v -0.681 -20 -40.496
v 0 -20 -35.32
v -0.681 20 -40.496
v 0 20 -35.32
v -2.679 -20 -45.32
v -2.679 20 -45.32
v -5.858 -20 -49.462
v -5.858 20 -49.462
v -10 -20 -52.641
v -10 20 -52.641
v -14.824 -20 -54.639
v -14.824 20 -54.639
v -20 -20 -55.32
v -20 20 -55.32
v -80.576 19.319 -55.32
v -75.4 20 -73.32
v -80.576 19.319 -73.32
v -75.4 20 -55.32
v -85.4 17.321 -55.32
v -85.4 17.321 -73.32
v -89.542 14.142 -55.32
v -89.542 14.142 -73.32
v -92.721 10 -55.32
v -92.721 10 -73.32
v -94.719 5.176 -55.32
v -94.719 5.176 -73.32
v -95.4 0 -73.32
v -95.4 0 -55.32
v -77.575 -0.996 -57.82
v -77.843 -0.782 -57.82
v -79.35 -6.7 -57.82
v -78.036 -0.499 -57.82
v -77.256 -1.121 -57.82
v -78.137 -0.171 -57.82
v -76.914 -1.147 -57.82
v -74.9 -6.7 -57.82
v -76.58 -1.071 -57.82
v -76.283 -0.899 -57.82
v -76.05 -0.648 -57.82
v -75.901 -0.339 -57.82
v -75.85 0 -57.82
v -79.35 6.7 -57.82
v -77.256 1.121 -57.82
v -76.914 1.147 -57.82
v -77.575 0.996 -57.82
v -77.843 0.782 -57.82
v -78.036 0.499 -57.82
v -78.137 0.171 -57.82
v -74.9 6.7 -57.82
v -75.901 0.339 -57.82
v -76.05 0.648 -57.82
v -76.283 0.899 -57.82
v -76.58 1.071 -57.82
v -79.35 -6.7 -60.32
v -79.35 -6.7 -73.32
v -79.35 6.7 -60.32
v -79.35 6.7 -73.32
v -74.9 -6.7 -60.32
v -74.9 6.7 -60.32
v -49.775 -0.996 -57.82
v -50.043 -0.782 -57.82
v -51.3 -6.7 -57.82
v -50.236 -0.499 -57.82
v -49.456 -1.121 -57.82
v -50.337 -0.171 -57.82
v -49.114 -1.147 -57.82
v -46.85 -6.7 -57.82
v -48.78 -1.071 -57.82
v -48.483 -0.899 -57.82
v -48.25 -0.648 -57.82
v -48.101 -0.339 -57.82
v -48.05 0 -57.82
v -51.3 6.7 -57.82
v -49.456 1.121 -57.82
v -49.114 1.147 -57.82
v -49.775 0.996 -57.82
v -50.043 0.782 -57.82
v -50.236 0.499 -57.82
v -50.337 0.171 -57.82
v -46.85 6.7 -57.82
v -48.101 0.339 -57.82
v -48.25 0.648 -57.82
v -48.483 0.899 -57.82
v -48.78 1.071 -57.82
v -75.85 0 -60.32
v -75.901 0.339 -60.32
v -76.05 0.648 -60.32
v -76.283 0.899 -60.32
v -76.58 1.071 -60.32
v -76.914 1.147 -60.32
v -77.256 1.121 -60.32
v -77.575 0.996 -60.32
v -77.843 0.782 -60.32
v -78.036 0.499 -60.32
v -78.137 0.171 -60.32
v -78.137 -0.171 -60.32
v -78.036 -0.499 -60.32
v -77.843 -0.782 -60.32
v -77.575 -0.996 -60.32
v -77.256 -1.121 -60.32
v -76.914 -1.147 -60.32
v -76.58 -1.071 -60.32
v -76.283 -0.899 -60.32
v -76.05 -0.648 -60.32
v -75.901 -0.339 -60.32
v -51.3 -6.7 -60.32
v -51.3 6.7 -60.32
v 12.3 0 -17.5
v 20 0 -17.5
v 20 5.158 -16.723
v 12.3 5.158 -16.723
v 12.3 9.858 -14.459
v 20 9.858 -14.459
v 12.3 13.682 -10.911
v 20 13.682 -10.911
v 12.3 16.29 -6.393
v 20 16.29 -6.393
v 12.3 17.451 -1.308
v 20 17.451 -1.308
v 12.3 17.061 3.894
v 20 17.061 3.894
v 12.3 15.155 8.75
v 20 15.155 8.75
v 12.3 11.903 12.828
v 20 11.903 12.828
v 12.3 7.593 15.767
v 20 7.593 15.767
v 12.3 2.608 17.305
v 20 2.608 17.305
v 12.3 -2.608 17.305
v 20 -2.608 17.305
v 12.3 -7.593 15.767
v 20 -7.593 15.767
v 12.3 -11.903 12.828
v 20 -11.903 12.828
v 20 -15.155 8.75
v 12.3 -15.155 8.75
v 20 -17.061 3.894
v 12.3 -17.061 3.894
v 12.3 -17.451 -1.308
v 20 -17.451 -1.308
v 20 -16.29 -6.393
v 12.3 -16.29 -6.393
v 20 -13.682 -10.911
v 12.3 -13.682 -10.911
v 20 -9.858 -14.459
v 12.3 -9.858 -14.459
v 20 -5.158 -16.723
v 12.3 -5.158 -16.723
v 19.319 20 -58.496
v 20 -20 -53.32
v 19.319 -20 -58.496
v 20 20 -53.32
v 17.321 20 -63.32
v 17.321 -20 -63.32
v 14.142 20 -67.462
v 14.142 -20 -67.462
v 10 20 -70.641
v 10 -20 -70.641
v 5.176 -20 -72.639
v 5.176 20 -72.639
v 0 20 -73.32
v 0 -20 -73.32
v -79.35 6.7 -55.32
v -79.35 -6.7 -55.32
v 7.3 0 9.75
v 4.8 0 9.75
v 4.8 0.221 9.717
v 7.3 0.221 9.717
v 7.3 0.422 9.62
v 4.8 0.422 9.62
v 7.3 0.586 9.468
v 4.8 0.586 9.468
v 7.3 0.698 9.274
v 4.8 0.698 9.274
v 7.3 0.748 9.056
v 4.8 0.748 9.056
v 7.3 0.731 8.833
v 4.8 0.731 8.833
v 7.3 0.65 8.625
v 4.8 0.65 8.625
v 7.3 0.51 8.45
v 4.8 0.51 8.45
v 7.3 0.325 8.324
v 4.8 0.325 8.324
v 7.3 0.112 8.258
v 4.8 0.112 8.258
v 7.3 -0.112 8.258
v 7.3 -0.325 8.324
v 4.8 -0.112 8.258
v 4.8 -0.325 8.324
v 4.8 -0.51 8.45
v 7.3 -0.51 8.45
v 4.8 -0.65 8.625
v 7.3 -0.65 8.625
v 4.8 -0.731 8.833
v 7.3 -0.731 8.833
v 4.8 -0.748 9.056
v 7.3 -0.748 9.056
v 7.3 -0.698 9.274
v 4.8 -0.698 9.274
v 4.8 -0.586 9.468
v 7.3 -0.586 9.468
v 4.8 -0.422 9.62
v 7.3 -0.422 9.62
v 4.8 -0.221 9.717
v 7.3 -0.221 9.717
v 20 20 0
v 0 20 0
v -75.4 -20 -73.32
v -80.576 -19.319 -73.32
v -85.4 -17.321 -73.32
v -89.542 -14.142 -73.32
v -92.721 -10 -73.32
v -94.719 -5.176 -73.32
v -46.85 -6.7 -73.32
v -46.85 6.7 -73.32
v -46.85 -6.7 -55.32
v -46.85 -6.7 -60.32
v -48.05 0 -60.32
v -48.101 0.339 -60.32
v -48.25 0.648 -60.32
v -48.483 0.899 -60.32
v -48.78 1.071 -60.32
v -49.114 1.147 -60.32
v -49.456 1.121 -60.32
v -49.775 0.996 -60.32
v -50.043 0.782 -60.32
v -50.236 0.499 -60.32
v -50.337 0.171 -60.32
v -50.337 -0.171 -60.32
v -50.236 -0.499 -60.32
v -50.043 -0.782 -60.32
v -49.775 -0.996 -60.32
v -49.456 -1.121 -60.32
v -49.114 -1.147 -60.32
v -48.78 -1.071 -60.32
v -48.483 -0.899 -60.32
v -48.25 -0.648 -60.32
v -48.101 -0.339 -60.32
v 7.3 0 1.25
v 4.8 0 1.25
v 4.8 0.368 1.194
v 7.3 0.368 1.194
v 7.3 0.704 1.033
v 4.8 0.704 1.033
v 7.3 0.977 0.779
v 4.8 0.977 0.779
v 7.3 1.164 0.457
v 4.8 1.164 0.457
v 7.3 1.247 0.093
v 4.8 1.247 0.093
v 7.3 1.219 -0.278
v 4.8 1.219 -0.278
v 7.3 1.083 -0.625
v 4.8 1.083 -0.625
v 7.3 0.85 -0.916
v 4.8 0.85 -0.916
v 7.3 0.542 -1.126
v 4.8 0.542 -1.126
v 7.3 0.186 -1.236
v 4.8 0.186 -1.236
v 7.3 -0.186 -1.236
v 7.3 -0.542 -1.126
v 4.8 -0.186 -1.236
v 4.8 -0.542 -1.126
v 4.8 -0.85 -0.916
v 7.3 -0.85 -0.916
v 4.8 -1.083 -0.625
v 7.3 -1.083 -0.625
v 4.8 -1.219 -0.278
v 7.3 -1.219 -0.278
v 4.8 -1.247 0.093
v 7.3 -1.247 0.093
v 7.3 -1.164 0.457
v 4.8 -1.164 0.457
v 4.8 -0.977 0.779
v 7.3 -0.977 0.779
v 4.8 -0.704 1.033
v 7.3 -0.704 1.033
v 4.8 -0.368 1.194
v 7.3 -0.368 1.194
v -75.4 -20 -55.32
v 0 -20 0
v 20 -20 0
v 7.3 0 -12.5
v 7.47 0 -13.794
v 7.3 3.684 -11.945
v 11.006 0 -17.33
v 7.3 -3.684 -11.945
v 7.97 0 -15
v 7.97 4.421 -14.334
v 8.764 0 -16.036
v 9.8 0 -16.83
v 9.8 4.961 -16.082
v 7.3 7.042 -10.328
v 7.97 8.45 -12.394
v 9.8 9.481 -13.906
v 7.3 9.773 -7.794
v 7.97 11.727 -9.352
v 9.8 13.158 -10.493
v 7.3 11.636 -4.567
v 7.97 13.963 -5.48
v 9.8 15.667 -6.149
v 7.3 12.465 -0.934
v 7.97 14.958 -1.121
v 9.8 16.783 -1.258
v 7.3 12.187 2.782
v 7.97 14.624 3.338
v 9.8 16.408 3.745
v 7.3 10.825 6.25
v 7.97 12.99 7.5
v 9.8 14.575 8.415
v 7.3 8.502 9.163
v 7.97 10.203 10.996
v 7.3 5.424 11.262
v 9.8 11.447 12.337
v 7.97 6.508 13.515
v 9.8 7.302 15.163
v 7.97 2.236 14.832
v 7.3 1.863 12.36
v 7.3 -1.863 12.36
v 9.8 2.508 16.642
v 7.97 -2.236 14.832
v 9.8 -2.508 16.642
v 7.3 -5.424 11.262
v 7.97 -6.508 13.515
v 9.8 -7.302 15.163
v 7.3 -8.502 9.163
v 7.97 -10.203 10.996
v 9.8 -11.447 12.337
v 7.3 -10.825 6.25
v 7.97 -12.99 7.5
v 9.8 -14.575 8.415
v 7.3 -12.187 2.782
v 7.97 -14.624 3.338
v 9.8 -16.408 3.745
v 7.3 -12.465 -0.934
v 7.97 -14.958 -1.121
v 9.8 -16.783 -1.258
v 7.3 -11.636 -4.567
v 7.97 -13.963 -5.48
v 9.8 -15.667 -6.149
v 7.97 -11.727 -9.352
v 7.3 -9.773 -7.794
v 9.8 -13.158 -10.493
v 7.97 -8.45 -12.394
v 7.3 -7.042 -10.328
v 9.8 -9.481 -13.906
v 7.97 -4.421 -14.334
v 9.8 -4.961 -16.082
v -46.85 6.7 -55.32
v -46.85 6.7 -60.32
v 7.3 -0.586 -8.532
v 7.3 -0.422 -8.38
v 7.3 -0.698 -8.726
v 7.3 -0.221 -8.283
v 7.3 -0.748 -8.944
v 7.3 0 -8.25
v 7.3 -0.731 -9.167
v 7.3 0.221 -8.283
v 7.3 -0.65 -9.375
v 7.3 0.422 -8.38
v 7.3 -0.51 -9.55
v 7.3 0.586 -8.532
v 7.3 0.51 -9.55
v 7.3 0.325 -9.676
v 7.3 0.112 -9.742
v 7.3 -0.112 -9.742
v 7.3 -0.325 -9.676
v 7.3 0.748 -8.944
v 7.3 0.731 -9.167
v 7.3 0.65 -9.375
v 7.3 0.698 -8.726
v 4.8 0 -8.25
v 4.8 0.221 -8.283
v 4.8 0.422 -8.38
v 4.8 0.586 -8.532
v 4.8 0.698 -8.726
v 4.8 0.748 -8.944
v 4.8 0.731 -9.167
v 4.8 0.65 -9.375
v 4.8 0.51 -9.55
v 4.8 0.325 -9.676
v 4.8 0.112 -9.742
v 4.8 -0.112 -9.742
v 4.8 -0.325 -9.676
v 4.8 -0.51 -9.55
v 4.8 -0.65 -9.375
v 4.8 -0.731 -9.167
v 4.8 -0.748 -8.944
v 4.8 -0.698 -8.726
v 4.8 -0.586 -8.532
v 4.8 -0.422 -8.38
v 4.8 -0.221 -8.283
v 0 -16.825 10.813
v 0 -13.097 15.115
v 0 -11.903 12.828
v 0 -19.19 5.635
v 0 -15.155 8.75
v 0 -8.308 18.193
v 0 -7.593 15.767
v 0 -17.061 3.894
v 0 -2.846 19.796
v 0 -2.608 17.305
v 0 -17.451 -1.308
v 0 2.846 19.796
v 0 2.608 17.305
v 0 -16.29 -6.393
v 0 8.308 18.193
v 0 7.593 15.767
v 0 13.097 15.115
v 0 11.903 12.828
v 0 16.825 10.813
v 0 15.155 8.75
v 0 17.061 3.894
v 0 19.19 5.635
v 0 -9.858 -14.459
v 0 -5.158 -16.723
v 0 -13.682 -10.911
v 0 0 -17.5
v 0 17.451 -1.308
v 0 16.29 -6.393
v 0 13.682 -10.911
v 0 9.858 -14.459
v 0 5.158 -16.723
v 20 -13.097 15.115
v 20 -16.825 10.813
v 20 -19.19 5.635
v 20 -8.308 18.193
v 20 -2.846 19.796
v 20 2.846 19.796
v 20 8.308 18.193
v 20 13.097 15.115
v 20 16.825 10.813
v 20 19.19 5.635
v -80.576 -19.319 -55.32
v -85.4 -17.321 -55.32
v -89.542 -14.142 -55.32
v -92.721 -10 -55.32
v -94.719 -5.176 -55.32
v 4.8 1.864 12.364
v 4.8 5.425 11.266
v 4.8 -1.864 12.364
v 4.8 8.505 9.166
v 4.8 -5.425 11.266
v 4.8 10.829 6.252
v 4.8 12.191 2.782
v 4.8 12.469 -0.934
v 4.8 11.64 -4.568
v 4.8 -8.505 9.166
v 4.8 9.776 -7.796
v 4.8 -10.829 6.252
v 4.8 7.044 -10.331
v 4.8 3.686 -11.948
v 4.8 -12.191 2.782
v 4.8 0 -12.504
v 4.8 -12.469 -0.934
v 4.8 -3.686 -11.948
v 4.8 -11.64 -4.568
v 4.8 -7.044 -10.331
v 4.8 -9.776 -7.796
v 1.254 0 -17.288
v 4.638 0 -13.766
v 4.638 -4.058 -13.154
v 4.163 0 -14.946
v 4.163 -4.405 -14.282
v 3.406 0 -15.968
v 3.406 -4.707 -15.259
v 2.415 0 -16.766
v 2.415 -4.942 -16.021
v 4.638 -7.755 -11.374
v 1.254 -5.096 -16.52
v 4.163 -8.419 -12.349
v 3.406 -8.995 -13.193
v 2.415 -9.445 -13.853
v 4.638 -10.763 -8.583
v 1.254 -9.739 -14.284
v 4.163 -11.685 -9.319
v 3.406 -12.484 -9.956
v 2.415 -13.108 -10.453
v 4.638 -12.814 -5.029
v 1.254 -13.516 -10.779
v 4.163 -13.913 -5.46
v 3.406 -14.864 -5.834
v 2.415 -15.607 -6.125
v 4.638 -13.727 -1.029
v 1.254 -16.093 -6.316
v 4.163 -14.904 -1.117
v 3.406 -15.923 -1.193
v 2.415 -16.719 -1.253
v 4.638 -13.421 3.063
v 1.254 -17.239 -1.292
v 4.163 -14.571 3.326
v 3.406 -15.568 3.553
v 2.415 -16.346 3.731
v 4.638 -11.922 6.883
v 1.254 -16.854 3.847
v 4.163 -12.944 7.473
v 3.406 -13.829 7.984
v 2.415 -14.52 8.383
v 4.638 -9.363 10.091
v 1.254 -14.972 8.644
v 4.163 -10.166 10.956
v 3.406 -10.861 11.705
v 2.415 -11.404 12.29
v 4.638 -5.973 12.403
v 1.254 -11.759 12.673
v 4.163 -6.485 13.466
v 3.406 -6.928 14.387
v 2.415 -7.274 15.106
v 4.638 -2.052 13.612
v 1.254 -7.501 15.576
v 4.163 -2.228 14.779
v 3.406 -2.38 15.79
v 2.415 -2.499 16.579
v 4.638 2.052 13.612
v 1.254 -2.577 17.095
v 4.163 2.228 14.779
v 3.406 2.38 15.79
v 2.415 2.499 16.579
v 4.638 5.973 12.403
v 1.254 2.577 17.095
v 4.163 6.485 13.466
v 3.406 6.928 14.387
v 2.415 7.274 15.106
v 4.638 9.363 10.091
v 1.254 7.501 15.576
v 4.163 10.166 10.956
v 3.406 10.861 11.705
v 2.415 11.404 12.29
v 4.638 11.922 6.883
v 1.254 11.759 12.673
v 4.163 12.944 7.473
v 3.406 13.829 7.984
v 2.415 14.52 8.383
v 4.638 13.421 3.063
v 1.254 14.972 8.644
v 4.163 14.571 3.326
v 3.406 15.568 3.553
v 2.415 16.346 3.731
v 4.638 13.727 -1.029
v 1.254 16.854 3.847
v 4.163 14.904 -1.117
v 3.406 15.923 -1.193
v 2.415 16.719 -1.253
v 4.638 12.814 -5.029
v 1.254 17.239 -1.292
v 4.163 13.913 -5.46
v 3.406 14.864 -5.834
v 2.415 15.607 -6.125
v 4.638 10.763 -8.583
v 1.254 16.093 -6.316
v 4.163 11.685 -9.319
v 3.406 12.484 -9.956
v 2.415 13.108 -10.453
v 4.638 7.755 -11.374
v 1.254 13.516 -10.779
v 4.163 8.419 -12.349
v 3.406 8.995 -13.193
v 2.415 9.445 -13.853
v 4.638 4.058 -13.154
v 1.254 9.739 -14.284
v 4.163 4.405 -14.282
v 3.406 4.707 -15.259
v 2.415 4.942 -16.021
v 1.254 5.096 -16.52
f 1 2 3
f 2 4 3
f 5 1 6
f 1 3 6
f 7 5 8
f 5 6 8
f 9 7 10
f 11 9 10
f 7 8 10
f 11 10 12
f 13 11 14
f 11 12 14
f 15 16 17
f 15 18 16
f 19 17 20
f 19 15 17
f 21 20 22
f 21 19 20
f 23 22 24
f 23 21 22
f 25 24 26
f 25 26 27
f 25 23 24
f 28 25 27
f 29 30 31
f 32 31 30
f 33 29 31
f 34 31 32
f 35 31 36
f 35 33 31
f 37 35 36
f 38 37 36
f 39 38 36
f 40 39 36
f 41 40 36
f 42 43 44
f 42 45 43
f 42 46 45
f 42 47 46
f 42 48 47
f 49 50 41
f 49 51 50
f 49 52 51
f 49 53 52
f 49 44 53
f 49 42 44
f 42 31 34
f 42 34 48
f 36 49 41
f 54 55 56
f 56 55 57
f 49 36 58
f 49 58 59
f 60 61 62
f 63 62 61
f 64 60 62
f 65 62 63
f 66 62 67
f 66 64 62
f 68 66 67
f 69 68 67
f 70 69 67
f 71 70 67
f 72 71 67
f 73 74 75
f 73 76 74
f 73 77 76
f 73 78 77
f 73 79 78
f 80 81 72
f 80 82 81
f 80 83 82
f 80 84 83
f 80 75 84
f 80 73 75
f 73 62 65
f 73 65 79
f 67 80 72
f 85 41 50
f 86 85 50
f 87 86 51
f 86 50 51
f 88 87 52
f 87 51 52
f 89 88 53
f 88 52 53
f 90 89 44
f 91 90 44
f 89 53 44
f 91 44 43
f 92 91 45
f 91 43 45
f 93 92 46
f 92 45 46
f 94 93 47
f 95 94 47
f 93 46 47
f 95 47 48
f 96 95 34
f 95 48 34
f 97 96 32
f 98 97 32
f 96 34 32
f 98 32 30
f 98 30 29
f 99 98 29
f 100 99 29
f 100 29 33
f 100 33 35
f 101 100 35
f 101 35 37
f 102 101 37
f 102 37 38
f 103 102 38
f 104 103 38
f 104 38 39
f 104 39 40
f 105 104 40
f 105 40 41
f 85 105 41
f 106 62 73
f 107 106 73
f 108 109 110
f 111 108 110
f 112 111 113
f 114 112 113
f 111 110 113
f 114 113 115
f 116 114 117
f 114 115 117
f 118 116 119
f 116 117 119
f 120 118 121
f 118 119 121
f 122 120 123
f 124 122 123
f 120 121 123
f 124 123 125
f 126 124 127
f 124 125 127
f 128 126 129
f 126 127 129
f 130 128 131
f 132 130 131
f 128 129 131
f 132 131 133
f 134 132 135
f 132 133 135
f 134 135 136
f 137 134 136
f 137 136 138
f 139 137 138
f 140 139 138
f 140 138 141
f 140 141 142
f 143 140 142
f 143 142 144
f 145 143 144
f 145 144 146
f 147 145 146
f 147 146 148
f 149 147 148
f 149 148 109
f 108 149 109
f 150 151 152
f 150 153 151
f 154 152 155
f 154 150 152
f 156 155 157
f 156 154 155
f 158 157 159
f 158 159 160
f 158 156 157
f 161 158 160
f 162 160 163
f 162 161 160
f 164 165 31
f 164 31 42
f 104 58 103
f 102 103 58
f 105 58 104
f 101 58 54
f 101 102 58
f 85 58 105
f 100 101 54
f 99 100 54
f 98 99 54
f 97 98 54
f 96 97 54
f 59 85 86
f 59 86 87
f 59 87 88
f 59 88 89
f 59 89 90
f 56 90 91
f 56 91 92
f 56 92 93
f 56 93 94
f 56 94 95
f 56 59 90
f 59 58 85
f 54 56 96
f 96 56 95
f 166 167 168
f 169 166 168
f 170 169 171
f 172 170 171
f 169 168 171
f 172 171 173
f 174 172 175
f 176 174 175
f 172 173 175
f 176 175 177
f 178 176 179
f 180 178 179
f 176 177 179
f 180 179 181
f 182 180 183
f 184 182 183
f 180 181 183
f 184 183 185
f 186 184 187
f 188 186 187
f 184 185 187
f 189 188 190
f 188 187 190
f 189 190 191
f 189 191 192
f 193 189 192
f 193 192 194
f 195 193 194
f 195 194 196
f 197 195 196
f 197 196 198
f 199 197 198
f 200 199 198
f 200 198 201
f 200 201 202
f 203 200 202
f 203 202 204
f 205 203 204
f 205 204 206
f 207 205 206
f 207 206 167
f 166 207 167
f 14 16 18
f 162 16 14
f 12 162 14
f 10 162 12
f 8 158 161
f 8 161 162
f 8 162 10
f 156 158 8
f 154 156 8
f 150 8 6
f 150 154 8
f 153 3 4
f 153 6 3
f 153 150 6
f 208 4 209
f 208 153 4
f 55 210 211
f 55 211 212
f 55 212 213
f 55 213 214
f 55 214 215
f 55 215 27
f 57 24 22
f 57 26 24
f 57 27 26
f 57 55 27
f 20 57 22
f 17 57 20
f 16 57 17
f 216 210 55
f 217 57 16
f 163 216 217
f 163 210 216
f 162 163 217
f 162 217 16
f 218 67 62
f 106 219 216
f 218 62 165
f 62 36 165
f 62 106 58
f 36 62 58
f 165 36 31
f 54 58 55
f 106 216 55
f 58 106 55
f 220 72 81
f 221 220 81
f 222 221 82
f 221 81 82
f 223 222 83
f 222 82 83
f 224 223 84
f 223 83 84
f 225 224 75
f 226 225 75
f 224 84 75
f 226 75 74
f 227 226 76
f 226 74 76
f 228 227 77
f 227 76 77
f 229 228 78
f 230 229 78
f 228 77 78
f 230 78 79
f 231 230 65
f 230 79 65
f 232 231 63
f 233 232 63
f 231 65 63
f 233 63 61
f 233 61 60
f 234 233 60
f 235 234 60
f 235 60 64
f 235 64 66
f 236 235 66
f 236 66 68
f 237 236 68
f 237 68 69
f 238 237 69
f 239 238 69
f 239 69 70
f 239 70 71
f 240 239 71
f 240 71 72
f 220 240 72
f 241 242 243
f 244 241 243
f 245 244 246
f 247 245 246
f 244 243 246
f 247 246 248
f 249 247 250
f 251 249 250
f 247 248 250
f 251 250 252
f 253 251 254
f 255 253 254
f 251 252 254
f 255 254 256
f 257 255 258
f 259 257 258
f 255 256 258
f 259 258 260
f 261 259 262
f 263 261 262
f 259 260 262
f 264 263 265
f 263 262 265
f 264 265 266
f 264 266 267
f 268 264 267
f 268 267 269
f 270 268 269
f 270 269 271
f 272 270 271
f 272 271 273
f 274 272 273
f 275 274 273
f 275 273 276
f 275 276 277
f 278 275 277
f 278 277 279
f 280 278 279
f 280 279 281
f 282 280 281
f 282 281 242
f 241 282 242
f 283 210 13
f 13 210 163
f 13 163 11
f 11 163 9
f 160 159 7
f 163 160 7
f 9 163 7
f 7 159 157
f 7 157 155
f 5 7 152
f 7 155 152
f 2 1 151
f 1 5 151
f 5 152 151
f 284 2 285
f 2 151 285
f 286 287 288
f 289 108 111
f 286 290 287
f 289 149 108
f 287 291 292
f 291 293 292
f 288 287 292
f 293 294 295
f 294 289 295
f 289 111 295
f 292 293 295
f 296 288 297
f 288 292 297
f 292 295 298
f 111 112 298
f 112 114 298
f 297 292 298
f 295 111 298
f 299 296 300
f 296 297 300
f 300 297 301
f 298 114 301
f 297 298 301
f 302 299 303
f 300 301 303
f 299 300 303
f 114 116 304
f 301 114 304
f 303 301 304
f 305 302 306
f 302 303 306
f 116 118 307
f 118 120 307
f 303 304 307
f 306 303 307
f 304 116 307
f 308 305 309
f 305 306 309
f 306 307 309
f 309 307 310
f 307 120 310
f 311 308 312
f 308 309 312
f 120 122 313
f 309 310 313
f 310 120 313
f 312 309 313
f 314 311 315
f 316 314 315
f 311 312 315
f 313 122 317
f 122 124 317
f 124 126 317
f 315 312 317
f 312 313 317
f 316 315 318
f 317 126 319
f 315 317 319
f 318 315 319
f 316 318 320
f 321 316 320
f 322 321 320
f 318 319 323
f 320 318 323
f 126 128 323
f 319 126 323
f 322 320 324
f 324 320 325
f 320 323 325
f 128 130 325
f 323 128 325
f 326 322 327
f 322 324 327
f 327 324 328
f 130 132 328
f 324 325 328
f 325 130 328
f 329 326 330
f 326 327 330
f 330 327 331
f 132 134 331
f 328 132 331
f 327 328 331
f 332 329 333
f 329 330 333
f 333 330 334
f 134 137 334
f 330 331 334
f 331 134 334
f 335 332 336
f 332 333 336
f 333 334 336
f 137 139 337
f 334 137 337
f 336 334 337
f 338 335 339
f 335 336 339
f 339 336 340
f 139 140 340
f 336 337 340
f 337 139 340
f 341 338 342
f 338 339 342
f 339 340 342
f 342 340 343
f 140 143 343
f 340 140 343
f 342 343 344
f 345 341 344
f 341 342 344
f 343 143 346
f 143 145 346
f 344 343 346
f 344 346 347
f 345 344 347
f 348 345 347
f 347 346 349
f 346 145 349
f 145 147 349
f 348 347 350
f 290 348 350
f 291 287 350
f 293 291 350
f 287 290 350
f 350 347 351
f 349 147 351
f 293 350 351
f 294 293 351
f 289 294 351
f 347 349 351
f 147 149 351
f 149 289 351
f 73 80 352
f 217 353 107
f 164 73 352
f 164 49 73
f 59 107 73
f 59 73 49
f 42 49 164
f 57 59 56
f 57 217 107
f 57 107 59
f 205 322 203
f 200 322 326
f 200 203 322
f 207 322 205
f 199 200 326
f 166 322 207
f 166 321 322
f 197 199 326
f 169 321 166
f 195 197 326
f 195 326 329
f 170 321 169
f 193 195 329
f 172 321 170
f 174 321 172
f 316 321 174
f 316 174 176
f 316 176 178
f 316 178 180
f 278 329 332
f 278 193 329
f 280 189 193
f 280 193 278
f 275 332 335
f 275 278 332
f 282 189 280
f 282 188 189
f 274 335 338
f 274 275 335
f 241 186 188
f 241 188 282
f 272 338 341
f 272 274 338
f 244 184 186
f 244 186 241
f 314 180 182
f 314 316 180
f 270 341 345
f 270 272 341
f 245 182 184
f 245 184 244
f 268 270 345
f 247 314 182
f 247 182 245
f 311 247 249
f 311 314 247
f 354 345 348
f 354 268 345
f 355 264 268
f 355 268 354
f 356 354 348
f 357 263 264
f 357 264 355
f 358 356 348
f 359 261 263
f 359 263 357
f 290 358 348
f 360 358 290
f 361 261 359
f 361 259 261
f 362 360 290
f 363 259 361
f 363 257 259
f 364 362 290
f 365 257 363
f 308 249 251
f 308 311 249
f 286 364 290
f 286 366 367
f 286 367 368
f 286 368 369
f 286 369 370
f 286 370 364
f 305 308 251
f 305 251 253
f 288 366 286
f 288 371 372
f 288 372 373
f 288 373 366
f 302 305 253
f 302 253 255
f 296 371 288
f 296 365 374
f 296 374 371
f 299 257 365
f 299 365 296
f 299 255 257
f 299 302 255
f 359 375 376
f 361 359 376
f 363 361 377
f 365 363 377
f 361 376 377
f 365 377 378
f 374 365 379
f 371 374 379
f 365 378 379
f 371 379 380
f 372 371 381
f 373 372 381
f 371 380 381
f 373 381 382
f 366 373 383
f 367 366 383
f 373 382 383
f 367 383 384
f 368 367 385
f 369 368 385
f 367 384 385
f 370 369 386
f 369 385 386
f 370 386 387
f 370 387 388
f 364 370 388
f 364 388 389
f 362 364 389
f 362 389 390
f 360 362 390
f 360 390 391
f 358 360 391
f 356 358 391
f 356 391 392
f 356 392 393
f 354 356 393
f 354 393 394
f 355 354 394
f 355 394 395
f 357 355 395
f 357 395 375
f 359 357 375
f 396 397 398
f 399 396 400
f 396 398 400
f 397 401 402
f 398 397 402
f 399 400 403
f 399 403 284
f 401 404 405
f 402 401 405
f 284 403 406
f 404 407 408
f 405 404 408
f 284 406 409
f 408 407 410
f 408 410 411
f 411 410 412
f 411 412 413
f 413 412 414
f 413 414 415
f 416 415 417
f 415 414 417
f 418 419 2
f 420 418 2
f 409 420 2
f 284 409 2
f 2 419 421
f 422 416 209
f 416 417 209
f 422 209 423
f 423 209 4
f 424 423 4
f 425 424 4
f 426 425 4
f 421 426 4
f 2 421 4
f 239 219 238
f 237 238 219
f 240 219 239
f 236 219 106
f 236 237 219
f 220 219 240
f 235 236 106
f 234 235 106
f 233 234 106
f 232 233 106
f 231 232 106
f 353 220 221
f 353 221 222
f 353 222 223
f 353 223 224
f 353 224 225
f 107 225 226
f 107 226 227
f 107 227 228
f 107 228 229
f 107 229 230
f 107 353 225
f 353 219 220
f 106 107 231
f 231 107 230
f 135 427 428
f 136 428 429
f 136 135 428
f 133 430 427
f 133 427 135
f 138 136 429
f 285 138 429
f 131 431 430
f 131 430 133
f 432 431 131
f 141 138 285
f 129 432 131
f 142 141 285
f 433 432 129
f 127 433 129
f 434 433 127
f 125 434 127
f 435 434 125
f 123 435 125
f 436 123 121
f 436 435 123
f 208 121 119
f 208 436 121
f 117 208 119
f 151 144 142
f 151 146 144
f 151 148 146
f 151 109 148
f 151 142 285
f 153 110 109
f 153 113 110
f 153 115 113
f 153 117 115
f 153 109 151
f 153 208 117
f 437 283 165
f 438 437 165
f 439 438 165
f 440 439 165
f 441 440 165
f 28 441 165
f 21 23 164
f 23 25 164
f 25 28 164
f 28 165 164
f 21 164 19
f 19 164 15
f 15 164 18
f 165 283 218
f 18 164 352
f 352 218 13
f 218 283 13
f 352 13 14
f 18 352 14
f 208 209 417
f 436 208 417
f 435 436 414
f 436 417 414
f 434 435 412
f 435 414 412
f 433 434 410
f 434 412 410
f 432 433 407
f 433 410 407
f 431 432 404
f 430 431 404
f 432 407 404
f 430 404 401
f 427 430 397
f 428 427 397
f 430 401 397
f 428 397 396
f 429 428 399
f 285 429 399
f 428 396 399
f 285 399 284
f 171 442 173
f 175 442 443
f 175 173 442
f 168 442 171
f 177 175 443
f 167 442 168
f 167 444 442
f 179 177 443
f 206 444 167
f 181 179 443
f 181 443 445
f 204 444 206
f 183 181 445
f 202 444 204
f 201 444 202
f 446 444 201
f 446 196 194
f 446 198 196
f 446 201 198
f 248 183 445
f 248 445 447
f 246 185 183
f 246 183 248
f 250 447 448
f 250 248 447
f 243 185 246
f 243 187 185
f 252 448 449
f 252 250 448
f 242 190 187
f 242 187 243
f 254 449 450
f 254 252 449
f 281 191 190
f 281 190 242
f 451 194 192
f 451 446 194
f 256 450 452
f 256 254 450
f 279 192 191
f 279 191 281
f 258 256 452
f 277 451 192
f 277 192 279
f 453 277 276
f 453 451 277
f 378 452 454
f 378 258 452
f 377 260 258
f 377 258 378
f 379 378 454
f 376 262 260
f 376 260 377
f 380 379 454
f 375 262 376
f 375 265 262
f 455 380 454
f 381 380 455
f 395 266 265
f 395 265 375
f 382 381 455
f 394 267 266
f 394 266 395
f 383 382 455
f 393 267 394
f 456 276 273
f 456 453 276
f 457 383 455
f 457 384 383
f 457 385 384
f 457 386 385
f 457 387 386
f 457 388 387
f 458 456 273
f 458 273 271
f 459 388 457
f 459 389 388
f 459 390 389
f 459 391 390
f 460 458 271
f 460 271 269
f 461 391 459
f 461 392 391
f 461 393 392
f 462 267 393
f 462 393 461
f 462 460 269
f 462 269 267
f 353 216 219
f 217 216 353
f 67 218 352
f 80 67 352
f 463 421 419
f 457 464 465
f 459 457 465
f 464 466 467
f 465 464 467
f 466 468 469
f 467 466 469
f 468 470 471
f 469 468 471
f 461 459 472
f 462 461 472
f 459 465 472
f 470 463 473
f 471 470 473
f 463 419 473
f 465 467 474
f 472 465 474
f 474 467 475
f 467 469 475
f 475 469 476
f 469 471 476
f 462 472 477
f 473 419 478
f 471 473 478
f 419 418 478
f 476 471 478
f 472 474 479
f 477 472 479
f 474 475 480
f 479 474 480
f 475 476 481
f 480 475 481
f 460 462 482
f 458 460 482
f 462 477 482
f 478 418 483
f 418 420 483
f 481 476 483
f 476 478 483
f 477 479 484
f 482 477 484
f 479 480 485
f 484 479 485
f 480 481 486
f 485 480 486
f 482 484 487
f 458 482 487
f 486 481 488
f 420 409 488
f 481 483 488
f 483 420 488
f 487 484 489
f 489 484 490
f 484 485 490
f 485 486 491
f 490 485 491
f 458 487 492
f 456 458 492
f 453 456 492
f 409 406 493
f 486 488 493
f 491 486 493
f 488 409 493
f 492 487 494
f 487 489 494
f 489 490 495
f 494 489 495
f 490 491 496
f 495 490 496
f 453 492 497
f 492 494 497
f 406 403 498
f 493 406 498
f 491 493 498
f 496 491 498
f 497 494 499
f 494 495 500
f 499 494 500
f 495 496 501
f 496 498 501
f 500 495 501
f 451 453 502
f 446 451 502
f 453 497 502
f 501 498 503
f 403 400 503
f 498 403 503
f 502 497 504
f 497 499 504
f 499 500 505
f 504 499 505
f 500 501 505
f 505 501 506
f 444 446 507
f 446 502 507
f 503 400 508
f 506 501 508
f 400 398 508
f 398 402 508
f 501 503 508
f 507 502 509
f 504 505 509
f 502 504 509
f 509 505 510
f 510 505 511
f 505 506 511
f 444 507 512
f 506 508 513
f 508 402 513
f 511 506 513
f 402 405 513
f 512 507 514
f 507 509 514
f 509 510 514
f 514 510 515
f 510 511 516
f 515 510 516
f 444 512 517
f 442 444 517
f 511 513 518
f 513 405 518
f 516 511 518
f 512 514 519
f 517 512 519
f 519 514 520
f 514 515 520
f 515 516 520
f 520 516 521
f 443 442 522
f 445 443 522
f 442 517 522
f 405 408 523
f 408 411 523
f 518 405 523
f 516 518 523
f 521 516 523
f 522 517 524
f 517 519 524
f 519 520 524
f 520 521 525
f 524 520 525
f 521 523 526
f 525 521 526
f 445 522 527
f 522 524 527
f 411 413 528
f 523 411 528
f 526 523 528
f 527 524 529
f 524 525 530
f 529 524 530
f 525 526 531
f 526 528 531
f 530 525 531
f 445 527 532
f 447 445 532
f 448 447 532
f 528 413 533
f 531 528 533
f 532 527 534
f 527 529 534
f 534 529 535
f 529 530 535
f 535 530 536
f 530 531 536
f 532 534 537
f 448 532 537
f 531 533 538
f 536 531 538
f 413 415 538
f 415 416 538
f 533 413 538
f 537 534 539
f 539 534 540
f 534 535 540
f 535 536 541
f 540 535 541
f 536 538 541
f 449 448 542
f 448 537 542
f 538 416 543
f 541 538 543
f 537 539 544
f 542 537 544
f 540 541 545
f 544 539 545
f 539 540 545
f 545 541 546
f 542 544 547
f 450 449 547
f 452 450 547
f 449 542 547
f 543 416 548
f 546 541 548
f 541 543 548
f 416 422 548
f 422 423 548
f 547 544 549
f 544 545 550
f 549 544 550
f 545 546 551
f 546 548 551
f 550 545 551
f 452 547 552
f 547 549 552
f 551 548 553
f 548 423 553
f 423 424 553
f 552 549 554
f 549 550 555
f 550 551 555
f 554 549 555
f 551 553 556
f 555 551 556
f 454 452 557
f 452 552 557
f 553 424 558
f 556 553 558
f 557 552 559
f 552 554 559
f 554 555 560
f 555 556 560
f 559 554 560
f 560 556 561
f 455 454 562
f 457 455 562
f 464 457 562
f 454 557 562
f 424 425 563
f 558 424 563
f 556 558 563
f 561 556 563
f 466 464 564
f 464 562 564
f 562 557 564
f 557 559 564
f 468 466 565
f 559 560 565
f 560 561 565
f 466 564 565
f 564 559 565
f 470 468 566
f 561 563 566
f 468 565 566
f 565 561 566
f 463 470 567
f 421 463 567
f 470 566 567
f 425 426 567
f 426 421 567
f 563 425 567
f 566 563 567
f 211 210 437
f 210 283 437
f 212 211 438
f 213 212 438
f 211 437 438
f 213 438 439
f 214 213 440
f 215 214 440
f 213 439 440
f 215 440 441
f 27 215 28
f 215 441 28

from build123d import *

# Parameters (mm, degrees)
BOSS_EXTRUDE1_DEPTH = 20
SKETCH2_R           = 17.5
CUT_EXTRUDE1_DEPTH  = 12.7
CUT_EXTRUDE2_START  = -4.8
SKETCH3_R           = 17.5
CUT_EXTRUDE2_DEPTH  = 4.8
SKETCH4_R           = 1.25
SKETCH4_R_2         = 0.75
CUT_EXTRUDE3_DEPTH  = 4.8
SKETCH5_W           = 18
SKETCH5_H           = 40
BOSS_EXTRUDE2_DEPTH = 95.4
FILLET1_R           = 20
SKETCH7_W           = 32.5
SKETCH7_H           = 13.4
CUT_EXTRUDE4_DEPTH  = 2.5
FILLET2_R           = 5
FILLET3_R           = 20
SKETCH8_W           = 32.5
SKETCH8_H           = 13.4
CUT_EXTRUDE5_DEPTH  = 13
SKETCH9_R           = 1.15
SKETCH9_W           = 23.6
SKETCH9_H           = 13.4
CUT_EXTRUDE6_DEPTH  = 13


# Some blends are built 0.0001 mm under size
with BuildPart() as part:
    # Sketch1 → Boss-Extrude1 (new body)
    with BuildSketch(Plane(origin=(0, 0, 0), x_dir=(0, 0, -1), z_dir=(1, 0, 0))):
        with BuildLine():
            Line((73.32, 20), (0, 20))
            ThreePointArc((0, 20), (14.142135624, 14.142135624), (20, 0))
            ThreePointArc((20, 0), (14.142135624, -14.142135624), (0, -20))
            Line((0, -20), (73.32, -20))
            Line((73.32, -20), (73.32, 20))
        make_face()
        with BuildLine():
            ThreePointArc((20, 0), (14.142135624, 14.142135624), (0, 20))
            Line((0, 20), (0, -20))
            ThreePointArc((0, -20), (14.142135624, -14.142135624), (20, 0))
        make_face()
        with BuildLine():
            Line((0, -20), (0, 20))
            ThreePointArc((0, 20), (-20, 0), (0, -20))
        make_face()
    extrude(amount=BOSS_EXTRUDE1_DEPTH)

    # Sketch2 → Cut-Extrude1 (cut)
    with BuildSketch(Plane(origin=(20, 0, 0), x_dir=(0, 0, -1), z_dir=(1, 0, 0))):
        Circle(SKETCH2_R)
    extrude(amount=-CUT_EXTRUDE1_DEPTH, mode=Mode.SUBTRACT)

    # Sketch3 → Cut-Extrude2 (cut)
    with BuildSketch(Plane.ZY.offset(CUT_EXTRUDE2_START)):
        with Locations(Location((0, 0, 0), (0, 0, 180))):
            Circle(SKETCH3_R)
    extrude(amount=CUT_EXTRUDE2_DEPTH, mode=Mode.SUBTRACT)

    # Sketch4 → Cut-Extrude3 (cut)
    with BuildSketch(Plane.ZY.offset(-4.8)):
        Circle(SKETCH4_R)
        with Locations((-9, 0)):
            Circle(SKETCH4_R_2)
        with Locations((9, 0)):
            Circle(SKETCH4_R_2)
    extrude(amount=-CUT_EXTRUDE3_DEPTH, mode=Mode.SUBTRACT)

    # Sketch5 → Boss-Extrude2 (add)
    with BuildSketch(Plane.ZY):
        with Locations((-64.32, 0)):
            Rectangle(SKETCH5_W, SKETCH5_H)
    extrude(amount=BOSS_EXTRUDE2_DEPTH)

    # Fillet1
    fillet1_edges = [part.edges().sort_by_distance(p)[0] for p in [
        (-95.4, -20, -64.32),
        (-95.4, 20, -64.32),
    ]]
    fillet(fillet1_edges, radius=FILLET1_R - 0.0001)  # a hair under: the kernel refuses the full size

    # Sketch7 → Cut-Extrude4 (cut)
    with BuildSketch(Plane.XY.offset(-55.32)):
        with Locations((-63.1, 0)):
            Rectangle(SKETCH7_W, SKETCH7_H)
    extrude(amount=-CUT_EXTRUDE4_DEPTH, mode=Mode.SUBTRACT)

    # Fillet2
    # the kernel refuses this fillet: 5 mm, written as the material it adds along each edge
    with BuildSketch(Plane(origin=(7.3, 0, 0), x_dir=(0, 0, -1), z_dir=(0, -1, 0))) as fillet2_piece_1:
        with BuildLine():
            CenterArc((17.5 - FILLET2_R, FILLET2_R), FILLET2_R, 270, 90)
            Line((17.5 - FILLET2_R, 0), (17.5 - FILLET2_R, -FILLET2_R * 0.02))
            Line((17.5 - FILLET2_R, -FILLET2_R * 0.02), (17.5 + FILLET2_R * 0.02, -FILLET2_R * 0.02))
            Line((17.5 + FILLET2_R * 0.02, -FILLET2_R * 0.02), (17.5 + FILLET2_R * 0.02, FILLET2_R))
            Line((17.5 + FILLET2_R * 0.02, FILLET2_R), (17.5, FILLET2_R))
        make_face()
    revolve(axis=Axis((7.3, 0, 0), (1, 0, 0)))
    with BuildSketch(Plane(origin=(4.8, 0, 0), x_dir=(0, 0, -1), z_dir=(0, 1, 0))) as fillet2_piece_2:
        with BuildLine():
            CenterArc((12.504001601, 5), FILLET2_R, 270, 87.707557224)
            Line((12.504001601, 0), (12.504001601, -0.1))
            Line((12.504001601, -0.1), (17.5, -0.1))
            Line((17.5, -0.1), (17.6, 0))
            ThreePointArc((17.6, 0), (17.6, 2.4), (17.599919968, 4.796))
            Line((17.599919968, 4.796), (17.5, 4.8))
        make_face()
    revolve(axis=Axis((4.8, 0, 0), (-1, 0, 0)))

    # Fillet3
    fillet3_edges = [part.edges().sort_by_distance(p)[0] for p in [
        (20, 0, -73.32),
        (0, 0, -55.32),
    ]]
    fillet(fillet3_edges, radius=FILLET3_R)

    # Sketch8 → Cut-Extrude5 (cut)
    with BuildSketch(Plane(origin=(0, 0, -73.32), x_dir=(-1, 0, 0), z_dir=(0, 0, -1))):
        with Locations((63.1, 0)):
            Rectangle(SKETCH8_W, SKETCH8_H)
    extrude(amount=-CUT_EXTRUDE5_DEPTH, mode=Mode.SUBTRACT)

    # Sketch9 → Cut-Extrude6 (cut)
    with BuildSketch(Plane.XY.offset(-57.82)):
        with Locations((-77, 0)):
            Circle(SKETCH9_R)
        with Locations((-49.2, 0)):
            Circle(SKETCH9_R)
        with Locations((-63.1, 0)):
            Rectangle(SKETCH9_W, SKETCH9_H)
    extrude(amount=-CUT_EXTRUDE6_DEPTH, mode=Mode.SUBTRACT)


solid = part.part
